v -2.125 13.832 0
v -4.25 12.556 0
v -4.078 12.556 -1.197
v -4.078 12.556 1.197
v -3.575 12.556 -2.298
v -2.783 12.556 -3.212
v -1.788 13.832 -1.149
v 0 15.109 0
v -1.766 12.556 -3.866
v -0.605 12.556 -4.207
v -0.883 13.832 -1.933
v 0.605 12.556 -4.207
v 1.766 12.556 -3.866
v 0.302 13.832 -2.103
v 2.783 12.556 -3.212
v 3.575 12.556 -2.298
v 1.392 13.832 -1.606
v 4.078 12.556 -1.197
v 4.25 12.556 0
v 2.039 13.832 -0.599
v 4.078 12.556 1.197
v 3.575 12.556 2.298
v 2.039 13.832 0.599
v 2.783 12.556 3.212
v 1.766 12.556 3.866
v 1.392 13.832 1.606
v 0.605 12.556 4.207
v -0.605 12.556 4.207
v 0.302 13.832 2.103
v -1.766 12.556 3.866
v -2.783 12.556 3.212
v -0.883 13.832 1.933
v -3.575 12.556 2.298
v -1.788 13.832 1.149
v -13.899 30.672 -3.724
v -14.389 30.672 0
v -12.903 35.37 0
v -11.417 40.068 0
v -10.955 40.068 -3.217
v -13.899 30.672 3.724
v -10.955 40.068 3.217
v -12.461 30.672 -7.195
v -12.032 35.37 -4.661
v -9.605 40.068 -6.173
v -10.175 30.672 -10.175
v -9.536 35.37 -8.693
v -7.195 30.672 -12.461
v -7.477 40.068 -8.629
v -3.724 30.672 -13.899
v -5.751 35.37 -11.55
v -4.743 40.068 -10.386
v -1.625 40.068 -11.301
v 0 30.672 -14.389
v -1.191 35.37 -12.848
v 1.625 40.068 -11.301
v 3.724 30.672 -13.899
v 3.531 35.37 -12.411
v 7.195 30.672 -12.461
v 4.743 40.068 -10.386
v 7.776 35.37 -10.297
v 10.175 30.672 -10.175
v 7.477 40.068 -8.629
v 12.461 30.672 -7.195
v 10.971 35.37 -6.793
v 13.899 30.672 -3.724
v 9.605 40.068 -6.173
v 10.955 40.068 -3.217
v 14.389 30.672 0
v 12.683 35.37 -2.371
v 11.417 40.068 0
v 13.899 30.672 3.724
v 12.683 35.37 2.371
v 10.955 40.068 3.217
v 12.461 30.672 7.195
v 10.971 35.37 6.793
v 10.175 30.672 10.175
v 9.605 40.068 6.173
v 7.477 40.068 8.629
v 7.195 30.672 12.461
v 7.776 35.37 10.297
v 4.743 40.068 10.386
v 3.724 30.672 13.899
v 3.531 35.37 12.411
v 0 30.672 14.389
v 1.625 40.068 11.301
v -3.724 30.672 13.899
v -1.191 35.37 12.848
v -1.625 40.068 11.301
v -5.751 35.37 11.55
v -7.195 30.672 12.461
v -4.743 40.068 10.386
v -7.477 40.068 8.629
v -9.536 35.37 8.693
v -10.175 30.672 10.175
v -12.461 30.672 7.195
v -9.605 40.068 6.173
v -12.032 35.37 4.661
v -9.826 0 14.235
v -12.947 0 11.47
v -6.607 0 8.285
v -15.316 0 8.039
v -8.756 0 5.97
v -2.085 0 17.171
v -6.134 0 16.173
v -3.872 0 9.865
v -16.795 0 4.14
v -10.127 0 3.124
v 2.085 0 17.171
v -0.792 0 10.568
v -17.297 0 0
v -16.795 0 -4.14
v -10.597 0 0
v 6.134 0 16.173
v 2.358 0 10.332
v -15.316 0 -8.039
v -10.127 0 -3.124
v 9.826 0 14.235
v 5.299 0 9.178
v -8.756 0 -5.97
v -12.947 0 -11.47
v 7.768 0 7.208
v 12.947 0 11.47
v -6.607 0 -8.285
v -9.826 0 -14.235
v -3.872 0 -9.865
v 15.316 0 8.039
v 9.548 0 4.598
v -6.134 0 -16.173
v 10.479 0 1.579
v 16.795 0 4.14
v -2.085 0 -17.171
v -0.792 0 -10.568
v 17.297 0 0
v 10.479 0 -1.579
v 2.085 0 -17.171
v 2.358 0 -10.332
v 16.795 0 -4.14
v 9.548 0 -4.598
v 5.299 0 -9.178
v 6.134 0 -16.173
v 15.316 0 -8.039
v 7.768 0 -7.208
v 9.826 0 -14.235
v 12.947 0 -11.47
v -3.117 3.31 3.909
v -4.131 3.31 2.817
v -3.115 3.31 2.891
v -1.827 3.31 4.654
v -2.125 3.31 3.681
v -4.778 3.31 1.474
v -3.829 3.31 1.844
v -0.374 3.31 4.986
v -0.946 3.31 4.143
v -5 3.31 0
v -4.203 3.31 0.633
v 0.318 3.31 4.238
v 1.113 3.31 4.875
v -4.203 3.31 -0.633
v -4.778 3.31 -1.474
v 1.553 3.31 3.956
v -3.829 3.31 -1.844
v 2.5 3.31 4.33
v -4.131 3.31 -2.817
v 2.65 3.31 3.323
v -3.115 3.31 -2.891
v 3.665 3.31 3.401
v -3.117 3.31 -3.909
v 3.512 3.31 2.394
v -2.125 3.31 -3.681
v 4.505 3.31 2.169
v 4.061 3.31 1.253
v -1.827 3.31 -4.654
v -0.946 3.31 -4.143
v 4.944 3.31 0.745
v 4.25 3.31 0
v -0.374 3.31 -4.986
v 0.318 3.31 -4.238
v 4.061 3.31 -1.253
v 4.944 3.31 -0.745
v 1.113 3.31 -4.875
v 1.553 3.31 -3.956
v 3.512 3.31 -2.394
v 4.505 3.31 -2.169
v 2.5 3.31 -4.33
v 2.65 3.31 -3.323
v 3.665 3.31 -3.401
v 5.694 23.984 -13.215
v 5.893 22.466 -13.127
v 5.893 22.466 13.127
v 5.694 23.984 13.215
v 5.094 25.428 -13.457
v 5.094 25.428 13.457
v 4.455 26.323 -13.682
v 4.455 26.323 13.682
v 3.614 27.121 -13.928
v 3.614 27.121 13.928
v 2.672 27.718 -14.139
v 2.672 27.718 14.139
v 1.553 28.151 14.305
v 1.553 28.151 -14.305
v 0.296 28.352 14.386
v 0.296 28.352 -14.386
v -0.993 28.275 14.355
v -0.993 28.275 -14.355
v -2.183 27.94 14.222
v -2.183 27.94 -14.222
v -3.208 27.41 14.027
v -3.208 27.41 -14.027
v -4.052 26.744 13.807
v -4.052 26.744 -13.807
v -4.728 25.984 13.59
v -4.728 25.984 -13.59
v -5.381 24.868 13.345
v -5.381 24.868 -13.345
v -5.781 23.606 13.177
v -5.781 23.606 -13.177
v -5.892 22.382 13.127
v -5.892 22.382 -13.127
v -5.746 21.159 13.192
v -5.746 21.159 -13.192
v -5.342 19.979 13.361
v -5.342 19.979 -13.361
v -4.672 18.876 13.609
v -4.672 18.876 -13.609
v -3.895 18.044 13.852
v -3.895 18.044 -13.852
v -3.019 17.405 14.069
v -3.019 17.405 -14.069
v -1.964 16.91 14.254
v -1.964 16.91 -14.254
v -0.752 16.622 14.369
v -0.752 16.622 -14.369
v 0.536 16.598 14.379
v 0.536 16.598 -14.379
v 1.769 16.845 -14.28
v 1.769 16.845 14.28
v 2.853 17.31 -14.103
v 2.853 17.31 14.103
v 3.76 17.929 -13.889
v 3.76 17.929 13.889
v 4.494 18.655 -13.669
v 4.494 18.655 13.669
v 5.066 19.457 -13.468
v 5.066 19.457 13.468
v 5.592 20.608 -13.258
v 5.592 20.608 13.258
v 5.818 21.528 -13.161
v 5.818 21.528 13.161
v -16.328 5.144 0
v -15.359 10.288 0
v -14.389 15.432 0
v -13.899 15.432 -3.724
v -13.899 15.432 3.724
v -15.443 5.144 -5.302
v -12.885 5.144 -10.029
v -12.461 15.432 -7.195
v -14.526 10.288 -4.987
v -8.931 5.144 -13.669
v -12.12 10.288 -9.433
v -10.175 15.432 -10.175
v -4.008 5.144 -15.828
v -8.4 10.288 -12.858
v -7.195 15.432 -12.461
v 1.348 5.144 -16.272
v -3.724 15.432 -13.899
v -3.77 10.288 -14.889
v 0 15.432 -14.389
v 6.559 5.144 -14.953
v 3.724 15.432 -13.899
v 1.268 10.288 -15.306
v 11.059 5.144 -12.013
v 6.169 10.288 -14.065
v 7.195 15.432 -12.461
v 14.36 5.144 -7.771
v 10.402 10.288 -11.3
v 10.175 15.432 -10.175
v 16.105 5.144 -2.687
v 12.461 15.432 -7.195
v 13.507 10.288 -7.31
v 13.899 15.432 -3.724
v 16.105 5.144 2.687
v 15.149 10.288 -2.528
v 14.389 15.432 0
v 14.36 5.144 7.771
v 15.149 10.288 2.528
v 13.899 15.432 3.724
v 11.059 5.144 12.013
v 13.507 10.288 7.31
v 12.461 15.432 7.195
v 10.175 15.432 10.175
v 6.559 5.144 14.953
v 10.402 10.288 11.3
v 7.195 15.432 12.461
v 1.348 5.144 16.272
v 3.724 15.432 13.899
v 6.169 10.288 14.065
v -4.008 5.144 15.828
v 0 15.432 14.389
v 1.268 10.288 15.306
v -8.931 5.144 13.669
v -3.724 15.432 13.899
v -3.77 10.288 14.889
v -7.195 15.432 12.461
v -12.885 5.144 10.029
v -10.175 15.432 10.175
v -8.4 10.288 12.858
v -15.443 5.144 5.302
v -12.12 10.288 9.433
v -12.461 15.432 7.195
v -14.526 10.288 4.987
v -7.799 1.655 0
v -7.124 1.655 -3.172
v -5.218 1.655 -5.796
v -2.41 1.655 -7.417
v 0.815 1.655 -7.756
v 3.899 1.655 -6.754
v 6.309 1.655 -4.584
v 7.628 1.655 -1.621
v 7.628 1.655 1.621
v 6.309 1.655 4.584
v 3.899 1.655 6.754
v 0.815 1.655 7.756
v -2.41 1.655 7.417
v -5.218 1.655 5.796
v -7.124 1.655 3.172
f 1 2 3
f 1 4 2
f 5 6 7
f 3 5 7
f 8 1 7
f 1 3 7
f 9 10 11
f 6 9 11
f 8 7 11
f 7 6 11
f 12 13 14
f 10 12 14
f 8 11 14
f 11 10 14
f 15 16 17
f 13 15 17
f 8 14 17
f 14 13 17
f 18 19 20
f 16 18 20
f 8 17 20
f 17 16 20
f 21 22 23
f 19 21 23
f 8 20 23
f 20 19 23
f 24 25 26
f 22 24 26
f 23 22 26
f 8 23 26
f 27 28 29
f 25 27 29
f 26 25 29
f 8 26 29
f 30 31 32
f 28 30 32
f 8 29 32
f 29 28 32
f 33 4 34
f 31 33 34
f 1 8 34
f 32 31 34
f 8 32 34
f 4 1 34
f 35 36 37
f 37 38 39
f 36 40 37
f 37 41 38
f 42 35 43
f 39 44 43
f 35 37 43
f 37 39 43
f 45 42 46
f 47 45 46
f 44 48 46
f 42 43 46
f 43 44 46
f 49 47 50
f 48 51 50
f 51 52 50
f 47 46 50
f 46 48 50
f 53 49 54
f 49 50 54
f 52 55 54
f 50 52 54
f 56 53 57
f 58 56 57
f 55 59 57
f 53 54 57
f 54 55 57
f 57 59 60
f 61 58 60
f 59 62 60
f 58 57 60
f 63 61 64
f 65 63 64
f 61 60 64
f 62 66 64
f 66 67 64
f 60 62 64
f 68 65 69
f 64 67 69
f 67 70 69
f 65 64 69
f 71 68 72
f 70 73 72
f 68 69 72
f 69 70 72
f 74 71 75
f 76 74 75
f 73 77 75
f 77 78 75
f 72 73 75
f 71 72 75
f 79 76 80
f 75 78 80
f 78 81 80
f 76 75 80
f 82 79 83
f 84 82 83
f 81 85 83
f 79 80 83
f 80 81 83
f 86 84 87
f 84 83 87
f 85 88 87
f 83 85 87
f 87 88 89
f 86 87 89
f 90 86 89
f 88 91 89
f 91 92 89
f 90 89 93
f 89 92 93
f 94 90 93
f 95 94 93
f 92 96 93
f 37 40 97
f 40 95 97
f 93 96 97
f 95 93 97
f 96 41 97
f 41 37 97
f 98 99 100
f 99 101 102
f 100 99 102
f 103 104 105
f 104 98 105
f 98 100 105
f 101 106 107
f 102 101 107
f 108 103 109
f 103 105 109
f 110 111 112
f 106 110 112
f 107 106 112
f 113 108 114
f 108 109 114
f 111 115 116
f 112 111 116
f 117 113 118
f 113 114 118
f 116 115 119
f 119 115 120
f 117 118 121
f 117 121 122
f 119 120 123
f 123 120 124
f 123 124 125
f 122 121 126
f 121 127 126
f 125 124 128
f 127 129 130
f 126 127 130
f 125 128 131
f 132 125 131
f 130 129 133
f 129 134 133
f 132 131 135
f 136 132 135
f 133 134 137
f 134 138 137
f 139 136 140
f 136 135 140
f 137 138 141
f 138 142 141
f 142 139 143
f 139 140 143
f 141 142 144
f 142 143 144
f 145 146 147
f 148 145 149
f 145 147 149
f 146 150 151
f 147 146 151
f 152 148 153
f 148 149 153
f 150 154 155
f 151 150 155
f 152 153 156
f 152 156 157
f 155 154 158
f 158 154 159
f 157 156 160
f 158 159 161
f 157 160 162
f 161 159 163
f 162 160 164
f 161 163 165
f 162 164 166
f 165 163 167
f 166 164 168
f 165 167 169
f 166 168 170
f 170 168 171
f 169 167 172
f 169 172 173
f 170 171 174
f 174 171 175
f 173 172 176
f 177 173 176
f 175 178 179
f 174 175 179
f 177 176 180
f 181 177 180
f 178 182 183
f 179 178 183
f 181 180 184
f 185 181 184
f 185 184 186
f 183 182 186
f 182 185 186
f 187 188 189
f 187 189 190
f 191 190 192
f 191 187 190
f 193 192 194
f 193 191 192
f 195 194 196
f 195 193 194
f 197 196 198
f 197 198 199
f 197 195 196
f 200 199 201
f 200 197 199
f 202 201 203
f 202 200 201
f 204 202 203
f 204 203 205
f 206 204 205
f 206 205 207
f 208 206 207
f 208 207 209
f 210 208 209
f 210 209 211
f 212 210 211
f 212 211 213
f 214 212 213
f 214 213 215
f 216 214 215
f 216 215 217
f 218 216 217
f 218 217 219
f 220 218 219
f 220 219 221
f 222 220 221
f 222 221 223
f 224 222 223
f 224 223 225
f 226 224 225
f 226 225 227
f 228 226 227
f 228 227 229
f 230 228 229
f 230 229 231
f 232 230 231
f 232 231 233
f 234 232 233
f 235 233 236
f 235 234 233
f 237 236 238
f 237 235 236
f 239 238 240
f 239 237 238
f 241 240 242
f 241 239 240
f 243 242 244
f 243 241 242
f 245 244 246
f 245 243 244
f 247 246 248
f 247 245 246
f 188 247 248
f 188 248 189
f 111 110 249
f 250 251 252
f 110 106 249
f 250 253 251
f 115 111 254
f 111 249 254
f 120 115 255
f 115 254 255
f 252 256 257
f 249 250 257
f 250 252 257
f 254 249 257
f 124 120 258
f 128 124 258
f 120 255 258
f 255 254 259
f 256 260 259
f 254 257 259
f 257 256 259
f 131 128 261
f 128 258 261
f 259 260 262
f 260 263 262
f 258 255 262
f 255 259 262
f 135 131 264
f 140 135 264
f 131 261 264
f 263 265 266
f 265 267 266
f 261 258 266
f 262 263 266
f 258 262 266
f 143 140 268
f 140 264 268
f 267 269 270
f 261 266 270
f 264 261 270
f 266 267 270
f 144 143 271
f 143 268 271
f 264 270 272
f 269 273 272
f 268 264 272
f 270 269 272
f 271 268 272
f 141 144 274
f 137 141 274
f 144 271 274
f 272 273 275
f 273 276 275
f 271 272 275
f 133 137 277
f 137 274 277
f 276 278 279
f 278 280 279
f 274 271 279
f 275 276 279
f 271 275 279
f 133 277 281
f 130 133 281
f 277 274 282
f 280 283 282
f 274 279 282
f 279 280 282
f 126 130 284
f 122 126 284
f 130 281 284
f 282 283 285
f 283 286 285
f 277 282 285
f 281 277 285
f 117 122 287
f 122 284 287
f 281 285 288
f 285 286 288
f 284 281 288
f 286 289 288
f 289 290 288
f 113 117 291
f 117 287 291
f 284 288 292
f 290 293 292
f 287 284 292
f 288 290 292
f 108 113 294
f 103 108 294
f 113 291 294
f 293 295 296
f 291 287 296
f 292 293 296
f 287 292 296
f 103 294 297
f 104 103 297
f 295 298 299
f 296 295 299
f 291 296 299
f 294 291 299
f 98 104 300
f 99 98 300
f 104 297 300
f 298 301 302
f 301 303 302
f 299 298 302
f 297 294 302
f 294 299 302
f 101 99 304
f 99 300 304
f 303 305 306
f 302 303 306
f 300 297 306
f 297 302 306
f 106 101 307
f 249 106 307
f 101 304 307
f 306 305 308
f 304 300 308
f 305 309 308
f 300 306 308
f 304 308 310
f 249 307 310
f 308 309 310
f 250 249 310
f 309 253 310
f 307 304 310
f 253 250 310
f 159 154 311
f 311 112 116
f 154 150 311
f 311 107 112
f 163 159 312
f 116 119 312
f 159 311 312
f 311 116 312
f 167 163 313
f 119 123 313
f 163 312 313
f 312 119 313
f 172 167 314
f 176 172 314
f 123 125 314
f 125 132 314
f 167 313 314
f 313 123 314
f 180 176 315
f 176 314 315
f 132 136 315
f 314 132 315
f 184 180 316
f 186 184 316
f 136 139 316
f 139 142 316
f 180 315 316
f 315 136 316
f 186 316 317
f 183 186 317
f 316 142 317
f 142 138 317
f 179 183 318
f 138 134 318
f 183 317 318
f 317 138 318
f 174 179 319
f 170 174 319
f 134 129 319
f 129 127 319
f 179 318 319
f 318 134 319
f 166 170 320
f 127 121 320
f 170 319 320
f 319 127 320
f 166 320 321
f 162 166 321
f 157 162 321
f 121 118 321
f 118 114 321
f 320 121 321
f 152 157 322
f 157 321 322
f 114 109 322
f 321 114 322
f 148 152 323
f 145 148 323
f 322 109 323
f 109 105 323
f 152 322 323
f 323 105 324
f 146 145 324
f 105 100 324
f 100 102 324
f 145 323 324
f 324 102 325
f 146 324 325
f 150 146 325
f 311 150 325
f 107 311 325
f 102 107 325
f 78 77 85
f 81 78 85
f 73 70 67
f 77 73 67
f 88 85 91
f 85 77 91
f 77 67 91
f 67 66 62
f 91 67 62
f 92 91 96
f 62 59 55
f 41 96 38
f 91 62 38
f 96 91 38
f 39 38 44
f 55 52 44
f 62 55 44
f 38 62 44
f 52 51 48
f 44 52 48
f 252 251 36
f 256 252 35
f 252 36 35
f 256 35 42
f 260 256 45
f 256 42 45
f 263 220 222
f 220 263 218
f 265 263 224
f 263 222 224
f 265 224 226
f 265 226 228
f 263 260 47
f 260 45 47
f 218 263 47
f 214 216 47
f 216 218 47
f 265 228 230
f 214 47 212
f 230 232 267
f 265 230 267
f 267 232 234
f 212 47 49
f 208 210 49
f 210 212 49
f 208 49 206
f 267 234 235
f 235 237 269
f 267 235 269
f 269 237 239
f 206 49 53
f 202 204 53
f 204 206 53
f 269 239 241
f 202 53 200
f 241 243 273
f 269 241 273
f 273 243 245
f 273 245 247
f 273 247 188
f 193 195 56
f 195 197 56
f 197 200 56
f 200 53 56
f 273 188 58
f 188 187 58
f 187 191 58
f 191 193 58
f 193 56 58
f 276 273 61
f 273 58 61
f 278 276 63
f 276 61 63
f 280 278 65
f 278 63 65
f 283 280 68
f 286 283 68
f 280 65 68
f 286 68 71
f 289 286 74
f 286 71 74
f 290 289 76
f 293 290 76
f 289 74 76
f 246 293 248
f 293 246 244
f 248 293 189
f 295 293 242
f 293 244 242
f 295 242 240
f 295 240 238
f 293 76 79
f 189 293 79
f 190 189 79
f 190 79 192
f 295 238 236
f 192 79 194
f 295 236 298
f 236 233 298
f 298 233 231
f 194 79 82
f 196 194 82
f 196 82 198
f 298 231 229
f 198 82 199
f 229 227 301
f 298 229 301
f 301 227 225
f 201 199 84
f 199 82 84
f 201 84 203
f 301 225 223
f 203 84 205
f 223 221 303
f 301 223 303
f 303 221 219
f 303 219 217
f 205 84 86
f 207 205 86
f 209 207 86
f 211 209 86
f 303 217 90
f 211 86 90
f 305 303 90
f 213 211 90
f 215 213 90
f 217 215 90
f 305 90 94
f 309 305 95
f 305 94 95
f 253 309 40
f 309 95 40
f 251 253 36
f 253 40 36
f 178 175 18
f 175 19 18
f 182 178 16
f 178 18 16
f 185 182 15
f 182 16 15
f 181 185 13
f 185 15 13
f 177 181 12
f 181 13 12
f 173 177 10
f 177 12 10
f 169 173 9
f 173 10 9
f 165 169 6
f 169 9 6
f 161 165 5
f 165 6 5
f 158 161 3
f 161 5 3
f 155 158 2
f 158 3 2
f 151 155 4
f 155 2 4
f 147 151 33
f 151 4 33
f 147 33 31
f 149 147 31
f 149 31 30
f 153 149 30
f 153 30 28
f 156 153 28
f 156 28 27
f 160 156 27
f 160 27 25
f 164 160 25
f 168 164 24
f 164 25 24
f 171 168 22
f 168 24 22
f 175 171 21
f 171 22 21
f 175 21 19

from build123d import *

# Parameters (mm, degrees)
CUT_EXTRUDE1_DEPTH         = 47.945551288
CUT_EXTRUDE1_DEPTH_BACK    = 47.945551288
SKETCH2_R                  = 5.8928
M10X1_5_TAPPED_HOLE1_D     = 8.5
M10X1_5_TAPPED_HOLE1_DEPTH = 9.2456
M10X1_5_TAPPED_HOLE1_TIP   = 2.553657631


with BuildPart() as part:
    # Sketch1 → Revolve1 (revolve)
    with BuildSketch(Plane.XY, mode=Mode.PRIVATE) as revolve1_sk:
        Polygon((0, 40.0685), (0, 3.31), (5, 3.31), (10.5974, 0), (17.2974, 0), (14.3891, 15.432044722), (14.3891, 30.672044722), (11.4173, 40.0685), align=None)
    revolve(revolve1_sk.sketch.rotate(Axis((0, 40.0685, 0), (0, -1, 0)), 180), axis=Axis((0, 40.0685, 0), (0, -1, 0)))

    # Sketch2 → Cut-Extrude1 (cut, two sides: drawn at the far end of the back side and taken through both)
    with BuildSketch(Plane.XY.offset(-CUT_EXTRUDE1_DEPTH_BACK)):
        with Locations((0, 22.4663)):
            Circle(SKETCH2_R)
    extrude(amount=CUT_EXTRUDE1_DEPTH + CUT_EXTRUDE1_DEPTH_BACK, mode=Mode.SUBTRACT)

    # M10x1.5 Tapped Hole1
    with Locations(Plane(origin=(0, 3.31, 0), x_dir=(-1, 0, 0), z_dir=(0, -1, 0))):
        with Locations((0, 0)):
            Hole(M10X1_5_TAPPED_HOLE1_D / 2, depth=M10X1_5_TAPPED_HOLE1_DEPTH)
            with Locations((0, 0, -(M10X1_5_TAPPED_HOLE1_DEPTH + M10X1_5_TAPPED_HOLE1_TIP / 2))):  # 118° drill point
                Cone(0, M10X1_5_TAPPED_HOLE1_D / 2, M10X1_5_TAPPED_HOLE1_TIP, mode=Mode.SUBTRACT)


solid = part.part
